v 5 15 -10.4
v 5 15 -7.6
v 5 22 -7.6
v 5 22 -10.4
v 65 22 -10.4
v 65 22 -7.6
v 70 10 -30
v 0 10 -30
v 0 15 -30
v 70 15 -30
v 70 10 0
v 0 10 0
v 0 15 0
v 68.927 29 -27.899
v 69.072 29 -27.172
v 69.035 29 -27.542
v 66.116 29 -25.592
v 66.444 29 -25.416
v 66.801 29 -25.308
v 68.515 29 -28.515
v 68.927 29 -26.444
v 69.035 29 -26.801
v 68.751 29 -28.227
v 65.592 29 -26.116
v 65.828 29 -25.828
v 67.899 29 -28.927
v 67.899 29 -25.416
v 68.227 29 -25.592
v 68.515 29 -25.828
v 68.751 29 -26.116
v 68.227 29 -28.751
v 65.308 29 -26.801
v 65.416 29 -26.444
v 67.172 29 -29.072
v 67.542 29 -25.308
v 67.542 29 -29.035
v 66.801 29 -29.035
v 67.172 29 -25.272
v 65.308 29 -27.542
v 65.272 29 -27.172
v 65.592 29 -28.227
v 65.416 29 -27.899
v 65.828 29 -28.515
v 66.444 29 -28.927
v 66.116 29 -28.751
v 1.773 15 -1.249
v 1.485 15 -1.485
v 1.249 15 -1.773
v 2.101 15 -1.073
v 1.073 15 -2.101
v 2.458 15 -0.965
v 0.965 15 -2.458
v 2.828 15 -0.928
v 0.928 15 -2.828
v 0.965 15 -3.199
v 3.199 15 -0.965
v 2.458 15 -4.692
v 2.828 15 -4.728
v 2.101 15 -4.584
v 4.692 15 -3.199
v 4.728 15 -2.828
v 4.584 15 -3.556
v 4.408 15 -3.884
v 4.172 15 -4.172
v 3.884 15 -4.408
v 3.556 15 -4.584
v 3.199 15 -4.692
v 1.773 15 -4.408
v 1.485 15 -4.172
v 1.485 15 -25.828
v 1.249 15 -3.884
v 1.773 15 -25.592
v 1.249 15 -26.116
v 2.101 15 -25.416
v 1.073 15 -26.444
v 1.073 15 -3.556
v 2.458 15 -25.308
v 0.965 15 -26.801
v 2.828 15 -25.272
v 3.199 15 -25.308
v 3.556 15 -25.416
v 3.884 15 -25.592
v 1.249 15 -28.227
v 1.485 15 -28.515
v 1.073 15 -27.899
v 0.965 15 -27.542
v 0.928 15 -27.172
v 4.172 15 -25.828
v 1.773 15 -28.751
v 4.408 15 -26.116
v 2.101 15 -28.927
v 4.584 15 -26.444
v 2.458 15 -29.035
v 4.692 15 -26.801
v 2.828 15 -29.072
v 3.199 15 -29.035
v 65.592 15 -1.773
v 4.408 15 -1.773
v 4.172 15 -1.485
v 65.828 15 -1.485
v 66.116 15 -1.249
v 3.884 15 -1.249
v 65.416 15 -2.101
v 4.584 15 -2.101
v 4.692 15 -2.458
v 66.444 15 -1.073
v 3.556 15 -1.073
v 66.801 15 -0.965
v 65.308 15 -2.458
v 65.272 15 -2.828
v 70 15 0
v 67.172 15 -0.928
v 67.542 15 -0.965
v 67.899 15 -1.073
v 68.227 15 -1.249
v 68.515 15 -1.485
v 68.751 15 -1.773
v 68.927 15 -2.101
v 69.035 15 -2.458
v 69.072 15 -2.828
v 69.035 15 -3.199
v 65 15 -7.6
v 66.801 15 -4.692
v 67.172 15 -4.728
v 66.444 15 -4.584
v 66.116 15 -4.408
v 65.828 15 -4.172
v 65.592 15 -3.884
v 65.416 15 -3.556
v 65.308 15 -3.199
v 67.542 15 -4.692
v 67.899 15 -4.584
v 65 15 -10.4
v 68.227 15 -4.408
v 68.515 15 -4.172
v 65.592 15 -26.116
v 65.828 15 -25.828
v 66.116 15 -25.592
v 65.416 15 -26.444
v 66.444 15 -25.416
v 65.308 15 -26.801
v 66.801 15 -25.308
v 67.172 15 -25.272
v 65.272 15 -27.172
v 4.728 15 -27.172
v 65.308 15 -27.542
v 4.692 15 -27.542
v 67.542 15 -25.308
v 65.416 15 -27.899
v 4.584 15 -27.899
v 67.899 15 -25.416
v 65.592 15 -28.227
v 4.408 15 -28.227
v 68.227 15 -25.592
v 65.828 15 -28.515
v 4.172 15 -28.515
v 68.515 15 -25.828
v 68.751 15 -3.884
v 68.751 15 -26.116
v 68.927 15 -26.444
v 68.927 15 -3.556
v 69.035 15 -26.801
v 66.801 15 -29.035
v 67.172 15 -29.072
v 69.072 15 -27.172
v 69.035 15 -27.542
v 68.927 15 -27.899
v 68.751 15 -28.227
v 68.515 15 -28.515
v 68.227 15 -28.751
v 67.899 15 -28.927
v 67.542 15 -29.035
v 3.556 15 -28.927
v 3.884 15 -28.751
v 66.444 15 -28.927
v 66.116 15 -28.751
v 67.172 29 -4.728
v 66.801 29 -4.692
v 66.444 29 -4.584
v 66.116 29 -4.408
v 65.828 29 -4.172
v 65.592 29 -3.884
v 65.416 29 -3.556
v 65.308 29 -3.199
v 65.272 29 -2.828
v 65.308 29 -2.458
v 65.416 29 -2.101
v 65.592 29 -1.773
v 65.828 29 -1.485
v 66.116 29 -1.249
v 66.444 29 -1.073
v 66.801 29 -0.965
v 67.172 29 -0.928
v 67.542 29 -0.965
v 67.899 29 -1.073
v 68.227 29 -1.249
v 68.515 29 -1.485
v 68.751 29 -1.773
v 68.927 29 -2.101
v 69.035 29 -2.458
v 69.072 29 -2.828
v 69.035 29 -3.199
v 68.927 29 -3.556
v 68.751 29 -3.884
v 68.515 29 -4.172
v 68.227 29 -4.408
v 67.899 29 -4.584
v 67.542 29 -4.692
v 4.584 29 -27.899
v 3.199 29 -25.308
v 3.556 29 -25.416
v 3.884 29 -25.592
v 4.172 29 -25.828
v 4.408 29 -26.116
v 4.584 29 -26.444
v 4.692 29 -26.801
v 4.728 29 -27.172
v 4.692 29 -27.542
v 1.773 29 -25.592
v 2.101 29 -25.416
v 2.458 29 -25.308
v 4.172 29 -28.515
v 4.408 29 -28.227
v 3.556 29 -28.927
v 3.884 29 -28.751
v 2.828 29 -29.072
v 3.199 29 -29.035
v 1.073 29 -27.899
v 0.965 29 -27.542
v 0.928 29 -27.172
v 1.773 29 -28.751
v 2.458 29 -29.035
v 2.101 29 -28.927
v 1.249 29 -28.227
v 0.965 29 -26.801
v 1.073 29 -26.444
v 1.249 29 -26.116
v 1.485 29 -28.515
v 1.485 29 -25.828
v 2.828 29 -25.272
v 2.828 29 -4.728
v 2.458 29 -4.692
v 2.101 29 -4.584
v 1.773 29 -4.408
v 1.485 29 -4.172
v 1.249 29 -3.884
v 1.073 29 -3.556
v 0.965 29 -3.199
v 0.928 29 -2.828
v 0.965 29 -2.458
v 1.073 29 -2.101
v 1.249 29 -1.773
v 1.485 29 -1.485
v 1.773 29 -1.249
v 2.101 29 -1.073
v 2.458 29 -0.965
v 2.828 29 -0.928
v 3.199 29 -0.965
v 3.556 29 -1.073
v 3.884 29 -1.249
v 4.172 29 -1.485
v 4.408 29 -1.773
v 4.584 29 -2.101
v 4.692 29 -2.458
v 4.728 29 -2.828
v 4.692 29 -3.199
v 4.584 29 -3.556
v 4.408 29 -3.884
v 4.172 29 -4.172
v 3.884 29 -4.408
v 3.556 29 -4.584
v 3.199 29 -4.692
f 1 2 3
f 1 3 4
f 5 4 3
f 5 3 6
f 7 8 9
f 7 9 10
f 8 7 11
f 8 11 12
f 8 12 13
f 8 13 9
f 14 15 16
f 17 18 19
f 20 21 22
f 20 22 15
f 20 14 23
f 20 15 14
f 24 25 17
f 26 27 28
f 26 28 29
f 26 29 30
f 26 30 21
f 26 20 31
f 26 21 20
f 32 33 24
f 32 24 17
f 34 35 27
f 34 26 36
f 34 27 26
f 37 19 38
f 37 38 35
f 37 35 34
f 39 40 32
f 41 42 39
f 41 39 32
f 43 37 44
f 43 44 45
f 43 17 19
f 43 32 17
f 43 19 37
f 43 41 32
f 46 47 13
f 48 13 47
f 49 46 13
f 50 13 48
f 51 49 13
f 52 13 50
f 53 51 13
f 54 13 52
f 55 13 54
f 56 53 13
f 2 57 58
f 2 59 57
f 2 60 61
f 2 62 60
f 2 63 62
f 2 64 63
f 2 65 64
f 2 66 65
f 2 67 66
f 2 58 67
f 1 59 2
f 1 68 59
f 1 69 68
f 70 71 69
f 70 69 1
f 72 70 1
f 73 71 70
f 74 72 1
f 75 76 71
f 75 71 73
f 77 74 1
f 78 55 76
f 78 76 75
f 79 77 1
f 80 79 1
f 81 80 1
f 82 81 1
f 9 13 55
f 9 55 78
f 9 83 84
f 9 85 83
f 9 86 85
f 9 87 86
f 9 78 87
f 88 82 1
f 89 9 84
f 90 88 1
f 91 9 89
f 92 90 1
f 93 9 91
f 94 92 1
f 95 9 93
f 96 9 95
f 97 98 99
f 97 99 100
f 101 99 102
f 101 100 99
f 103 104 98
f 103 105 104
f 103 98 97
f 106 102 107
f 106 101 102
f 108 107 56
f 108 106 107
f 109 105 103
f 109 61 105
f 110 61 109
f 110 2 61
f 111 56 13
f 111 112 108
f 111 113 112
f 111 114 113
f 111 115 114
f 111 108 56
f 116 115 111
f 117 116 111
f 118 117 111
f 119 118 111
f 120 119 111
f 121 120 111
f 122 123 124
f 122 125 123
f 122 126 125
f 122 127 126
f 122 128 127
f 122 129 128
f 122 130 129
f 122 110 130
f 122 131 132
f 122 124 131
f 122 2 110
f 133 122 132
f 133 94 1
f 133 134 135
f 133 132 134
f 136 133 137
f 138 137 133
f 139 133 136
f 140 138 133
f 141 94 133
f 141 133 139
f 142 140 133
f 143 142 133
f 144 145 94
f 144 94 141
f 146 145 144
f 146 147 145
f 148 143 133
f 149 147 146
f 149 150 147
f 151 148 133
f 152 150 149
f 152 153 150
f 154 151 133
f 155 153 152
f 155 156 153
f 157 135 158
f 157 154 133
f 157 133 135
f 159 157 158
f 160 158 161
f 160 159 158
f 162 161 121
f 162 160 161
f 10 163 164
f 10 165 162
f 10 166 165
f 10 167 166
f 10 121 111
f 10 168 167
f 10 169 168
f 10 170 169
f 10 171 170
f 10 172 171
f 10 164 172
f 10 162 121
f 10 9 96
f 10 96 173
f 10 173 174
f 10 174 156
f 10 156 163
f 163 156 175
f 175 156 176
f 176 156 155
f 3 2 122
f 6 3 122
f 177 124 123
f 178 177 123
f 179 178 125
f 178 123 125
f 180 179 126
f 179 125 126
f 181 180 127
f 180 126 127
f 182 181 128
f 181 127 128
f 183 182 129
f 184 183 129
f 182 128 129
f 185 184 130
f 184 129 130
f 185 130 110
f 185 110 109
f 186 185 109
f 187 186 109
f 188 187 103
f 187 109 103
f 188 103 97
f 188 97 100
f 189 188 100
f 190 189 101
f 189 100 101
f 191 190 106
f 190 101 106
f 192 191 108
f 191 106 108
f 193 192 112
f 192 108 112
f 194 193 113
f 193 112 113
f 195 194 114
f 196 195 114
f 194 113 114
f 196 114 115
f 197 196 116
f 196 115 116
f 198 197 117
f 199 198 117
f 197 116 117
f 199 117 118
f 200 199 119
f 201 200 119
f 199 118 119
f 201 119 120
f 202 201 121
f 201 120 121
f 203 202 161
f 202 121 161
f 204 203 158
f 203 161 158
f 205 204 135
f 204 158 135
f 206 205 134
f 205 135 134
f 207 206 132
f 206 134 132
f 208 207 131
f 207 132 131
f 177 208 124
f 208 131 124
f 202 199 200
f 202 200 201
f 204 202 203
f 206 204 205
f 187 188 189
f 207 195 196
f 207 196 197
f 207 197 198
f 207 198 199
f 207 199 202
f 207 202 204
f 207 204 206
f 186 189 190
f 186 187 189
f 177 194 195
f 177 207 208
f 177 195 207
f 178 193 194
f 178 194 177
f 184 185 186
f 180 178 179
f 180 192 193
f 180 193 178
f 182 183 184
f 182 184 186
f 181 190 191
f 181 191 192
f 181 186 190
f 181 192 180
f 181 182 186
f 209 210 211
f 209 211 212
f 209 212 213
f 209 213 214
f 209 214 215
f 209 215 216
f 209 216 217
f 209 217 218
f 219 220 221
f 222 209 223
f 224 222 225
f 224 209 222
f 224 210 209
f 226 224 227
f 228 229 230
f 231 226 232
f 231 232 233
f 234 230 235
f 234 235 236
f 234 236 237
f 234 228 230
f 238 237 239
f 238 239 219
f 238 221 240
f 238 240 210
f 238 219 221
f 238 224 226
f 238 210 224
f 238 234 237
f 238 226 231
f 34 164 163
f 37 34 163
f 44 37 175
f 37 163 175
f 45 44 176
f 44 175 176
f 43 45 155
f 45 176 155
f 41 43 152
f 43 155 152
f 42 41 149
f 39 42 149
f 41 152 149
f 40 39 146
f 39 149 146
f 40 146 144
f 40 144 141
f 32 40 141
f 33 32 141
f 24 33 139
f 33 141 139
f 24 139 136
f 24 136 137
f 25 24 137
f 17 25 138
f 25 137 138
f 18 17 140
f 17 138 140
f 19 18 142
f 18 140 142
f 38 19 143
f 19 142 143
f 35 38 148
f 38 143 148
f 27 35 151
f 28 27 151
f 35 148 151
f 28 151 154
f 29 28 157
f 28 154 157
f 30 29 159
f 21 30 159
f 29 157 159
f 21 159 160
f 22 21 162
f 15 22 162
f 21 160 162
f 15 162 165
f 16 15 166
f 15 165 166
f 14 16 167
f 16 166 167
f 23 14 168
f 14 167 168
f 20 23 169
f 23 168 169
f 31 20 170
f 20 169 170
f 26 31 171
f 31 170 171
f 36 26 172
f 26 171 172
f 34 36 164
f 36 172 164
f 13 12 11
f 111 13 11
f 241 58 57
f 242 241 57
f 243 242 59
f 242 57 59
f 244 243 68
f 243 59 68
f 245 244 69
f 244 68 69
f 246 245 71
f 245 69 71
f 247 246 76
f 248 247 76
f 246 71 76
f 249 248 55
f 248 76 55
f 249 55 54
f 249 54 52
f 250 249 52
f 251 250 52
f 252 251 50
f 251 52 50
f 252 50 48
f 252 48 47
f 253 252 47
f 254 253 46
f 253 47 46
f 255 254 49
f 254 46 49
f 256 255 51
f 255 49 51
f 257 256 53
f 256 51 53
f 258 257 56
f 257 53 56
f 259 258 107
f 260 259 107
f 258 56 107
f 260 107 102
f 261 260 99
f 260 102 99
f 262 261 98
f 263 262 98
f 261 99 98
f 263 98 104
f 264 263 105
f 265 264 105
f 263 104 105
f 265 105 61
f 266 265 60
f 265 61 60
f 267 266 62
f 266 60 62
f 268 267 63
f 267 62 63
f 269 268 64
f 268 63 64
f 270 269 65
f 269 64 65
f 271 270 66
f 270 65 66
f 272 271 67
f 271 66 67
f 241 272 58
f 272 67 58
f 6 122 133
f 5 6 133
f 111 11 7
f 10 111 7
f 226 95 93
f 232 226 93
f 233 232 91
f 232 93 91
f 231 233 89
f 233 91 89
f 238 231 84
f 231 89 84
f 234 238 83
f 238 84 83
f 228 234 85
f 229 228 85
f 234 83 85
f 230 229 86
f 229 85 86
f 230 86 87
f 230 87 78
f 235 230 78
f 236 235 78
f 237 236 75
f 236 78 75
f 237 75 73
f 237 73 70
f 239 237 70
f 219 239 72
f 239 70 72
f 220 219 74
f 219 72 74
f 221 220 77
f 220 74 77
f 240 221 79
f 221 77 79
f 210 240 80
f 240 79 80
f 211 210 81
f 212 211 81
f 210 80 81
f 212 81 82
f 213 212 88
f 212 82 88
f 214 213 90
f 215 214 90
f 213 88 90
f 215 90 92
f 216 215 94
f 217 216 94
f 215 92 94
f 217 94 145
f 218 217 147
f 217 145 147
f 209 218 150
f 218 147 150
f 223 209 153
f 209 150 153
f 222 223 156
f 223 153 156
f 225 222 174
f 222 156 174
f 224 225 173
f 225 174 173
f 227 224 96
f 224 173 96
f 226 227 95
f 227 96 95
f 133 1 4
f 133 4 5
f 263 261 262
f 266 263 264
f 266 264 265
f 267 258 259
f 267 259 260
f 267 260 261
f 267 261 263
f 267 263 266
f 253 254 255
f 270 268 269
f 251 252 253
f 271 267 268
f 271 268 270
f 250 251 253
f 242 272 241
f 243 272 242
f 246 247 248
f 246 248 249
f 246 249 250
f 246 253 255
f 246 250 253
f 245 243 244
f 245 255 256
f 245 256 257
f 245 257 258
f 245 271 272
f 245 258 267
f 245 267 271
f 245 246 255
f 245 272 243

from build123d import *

# Parameters (mm, degrees)
SKETCH1_W           = 70
SKETCH1_H           = 30
BOSS_EXTRUDE1_DEPTH = 15
SKETCH3_W           = 60
SKETCH3_H           = 2.8
BOSS_EXTRUDE3_DEPTH = 7
SKETCH4_W           = 70
SKETCH4_H           = 30
CUT_EXTRUDE1_DEPTH  = 10
SKETCH5_R           = 1.9
BOSS_EXTRUDE4_DEPTH = 14


with BuildPart() as part:
    # Sketch1 → Boss-Extrude1 (new body)
    with BuildSketch(Plane(origin=(0, 0, 0), x_dir=(1, 0, 0), z_dir=(0, 1, 0))):
        with Locations((35, 15)):
            Rectangle(SKETCH1_W, SKETCH1_H)
    extrude(amount=BOSS_EXTRUDE1_DEPTH)

    # Sketch3 → Boss-Extrude3 (add)
    with BuildSketch(Plane(origin=(0, 15, 0), x_dir=(1, 0, 0), z_dir=(0, 1, 0))):
        with Locations((35, 9)):
            Rectangle(SKETCH3_W, SKETCH3_H)
    extrude(amount=BOSS_EXTRUDE3_DEPTH)

    # Sketch4 → Cut-Extrude1 (cut)
    with BuildSketch(Plane(origin=(0, 0, 0), x_dir=(-1, 0, 0), z_dir=(0, -1, 0))):
        with Locations((-35, 15)):
            Rectangle(SKETCH4_W, SKETCH4_H)
    extrude(amount=-CUT_EXTRUDE1_DEPTH, mode=Mode.SUBTRACT)

    # Sketch5 → Boss-Extrude4 (add)
    with BuildSketch(Plane(origin=(0, 15, 0), x_dir=(1, 0, 0), z_dir=(0, 1, 0))):
        with Locations(Location((2.828427125, 2.828427125, 0), (0, 0, 90))):
            Circle(SKETCH5_R)
        with Locations(Location((2.828427125, 27.171572875, 0), (0, 0, 90))):
            Circle(SKETCH5_R)
        with Locations(Location((67.171572875, 27.171572875, 0), (0, 0, 90))):
            Circle(SKETCH5_R)
        with Locations(Location((67.171572875, 2.828427125, 0), (0, 0, 90))):
            Circle(SKETCH5_R)
    extrude(amount=BOSS_EXTRUDE4_DEPTH)


solid = part.part
